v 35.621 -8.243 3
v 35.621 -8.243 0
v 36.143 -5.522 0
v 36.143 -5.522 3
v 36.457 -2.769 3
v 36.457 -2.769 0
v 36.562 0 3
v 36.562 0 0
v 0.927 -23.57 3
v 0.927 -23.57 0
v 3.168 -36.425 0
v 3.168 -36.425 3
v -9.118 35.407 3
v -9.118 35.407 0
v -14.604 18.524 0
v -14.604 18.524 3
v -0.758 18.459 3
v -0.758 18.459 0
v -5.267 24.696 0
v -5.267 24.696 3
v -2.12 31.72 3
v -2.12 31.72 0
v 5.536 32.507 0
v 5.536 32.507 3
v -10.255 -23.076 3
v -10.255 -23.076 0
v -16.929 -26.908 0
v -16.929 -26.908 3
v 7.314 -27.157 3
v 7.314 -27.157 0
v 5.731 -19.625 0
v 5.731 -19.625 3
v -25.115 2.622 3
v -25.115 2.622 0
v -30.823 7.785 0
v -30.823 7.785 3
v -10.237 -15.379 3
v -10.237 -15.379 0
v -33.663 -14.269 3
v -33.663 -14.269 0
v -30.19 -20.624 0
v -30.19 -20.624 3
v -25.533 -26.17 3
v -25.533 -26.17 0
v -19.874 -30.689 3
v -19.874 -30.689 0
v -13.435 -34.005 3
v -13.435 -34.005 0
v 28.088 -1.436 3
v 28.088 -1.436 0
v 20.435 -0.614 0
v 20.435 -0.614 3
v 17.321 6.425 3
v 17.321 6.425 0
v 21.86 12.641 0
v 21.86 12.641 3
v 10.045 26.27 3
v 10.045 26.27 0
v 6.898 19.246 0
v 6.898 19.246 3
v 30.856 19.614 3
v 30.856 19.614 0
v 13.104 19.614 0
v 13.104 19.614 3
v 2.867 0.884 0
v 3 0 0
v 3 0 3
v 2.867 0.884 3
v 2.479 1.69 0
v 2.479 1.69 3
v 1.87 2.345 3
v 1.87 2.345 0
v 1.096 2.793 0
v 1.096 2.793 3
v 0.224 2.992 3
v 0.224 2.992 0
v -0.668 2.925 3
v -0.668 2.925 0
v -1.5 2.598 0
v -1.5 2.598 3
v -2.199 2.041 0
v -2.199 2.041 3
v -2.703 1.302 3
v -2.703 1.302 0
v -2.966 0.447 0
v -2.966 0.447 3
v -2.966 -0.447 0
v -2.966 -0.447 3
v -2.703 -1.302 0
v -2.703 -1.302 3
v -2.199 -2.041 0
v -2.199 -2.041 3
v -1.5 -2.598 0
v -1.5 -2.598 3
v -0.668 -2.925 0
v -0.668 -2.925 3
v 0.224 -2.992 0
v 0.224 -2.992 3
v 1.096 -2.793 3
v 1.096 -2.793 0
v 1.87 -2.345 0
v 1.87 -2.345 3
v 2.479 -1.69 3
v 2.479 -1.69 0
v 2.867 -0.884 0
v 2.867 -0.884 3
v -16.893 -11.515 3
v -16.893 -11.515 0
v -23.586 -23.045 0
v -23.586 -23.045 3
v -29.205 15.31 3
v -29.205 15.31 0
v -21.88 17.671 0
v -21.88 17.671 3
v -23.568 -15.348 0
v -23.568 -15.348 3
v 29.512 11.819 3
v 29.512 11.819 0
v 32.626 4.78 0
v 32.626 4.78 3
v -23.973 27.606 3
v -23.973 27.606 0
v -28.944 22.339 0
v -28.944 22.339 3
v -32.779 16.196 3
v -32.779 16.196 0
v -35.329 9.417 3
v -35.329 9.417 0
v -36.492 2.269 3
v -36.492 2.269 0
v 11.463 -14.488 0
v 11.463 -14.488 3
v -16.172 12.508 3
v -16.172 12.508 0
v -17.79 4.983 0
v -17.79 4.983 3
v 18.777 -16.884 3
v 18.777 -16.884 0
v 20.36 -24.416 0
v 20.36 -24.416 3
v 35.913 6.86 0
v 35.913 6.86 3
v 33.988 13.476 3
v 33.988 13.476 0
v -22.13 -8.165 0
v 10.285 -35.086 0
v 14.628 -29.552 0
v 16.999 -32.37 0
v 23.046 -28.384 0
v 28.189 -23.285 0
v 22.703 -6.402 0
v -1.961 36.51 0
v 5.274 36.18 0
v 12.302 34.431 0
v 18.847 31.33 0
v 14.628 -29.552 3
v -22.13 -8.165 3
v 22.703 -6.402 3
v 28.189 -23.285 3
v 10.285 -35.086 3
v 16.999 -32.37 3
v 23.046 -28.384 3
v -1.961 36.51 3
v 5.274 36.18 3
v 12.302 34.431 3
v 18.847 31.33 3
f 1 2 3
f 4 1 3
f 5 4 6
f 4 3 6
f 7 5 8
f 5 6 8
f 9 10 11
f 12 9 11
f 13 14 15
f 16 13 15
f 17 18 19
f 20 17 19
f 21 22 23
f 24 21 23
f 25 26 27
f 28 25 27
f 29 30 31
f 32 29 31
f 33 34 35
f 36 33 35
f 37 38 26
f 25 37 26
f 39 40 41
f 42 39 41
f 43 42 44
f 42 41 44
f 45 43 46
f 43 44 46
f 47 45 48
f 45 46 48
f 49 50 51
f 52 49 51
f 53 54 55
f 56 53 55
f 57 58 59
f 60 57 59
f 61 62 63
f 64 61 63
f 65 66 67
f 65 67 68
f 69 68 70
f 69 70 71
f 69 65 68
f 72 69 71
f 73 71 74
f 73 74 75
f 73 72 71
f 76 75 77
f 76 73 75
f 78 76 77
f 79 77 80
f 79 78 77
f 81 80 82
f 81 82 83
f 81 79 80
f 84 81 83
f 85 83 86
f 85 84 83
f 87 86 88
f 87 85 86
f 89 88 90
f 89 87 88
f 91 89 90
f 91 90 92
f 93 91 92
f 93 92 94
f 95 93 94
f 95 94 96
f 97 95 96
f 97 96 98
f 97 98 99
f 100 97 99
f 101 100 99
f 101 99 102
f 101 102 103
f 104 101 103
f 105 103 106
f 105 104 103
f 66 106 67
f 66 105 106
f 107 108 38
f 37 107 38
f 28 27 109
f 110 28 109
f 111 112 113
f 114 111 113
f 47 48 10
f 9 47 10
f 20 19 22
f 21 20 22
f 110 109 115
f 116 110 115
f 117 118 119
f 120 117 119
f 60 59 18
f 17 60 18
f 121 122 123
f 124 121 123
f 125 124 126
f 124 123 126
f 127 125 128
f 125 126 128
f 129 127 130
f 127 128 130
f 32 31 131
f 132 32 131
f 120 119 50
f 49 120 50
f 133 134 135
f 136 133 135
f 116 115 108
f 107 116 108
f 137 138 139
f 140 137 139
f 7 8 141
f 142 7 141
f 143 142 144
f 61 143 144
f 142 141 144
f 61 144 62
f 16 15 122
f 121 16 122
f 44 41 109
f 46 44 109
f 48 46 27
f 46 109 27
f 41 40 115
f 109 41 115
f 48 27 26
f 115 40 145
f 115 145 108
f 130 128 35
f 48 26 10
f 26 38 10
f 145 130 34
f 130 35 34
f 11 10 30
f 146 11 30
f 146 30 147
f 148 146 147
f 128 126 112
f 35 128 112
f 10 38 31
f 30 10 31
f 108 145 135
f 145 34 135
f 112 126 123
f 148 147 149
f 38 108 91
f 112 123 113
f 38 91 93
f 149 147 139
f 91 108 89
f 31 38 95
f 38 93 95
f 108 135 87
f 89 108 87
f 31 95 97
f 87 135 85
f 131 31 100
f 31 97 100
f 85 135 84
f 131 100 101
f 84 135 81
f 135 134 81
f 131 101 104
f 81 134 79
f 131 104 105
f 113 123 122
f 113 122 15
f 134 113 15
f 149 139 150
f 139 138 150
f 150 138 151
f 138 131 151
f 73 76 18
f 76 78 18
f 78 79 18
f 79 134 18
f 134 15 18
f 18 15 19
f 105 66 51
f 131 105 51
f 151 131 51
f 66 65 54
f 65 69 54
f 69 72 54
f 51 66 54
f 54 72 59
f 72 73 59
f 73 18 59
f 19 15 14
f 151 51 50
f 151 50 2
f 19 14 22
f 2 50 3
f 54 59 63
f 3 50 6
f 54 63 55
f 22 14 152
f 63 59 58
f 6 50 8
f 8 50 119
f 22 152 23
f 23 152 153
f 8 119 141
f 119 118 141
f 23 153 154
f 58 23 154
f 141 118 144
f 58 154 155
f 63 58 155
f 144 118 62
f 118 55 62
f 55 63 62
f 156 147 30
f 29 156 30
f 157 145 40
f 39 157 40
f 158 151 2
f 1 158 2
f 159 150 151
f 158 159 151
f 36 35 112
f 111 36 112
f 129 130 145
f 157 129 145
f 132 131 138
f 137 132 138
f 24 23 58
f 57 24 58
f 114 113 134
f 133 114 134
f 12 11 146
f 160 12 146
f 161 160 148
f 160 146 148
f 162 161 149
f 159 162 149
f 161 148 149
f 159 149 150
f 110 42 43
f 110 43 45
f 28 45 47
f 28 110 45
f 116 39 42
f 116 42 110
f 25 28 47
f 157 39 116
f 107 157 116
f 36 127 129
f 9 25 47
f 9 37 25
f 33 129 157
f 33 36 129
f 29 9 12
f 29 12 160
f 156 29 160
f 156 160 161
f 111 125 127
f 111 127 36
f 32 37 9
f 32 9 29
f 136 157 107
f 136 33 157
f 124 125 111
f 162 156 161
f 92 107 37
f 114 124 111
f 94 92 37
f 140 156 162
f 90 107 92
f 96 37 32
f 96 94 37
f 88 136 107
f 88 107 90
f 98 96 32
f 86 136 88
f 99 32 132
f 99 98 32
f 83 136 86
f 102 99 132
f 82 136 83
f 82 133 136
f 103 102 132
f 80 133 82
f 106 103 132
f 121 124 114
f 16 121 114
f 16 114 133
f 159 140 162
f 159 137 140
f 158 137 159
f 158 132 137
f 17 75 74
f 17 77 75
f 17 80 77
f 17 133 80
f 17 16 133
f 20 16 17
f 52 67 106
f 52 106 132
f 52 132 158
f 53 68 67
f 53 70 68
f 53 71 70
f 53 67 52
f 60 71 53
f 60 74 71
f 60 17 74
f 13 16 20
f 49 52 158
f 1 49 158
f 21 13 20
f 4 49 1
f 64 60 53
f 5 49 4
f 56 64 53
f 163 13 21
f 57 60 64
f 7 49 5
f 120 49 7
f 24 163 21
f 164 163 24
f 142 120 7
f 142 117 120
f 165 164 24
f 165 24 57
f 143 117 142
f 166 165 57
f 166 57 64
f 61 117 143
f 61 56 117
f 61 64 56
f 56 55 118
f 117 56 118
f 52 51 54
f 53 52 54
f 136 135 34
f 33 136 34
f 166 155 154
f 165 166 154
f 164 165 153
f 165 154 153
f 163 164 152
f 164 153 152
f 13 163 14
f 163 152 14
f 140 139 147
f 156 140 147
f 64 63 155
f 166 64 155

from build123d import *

# Parameters (mm, degrees)
F0_R     = 3
F1_DEPTH = 3


with BuildPart() as f1:
    # F0 (on Top) → F1 (new body)
    with BuildSketch(Plane.XY):
        with BuildLine():
            ThreePointArc((35.620954, -8.242963), (36.326171, -4.148268), (36.562259, 0))
            ThreePointArc((36.562259, 0), (35.106793, 10.213321), (30.85627, 19.613501))
            Line((30.85627, 19.613501), (13.104219, 19.613501))
            Line((13.104219, 19.613501), (18.847004, 31.330325))
            ThreePointArc((18.847004, 31.330325), (5.274088, 36.179867), (-9.118436, 35.406962))
            Line((-9.118436, 35.406962), (-14.604121, 18.523758))
            Line((-14.604121, 18.523758), (-23.972865, 27.606169))
            ThreePointArc((-23.972865, 27.606169), (-32.779316, 16.196149), (-36.491773, 2.269205))
            Line((-36.491773, 2.269205), (-22.130062, -8.165189))
            Line((-22.130062, -8.165189), (-33.663049, -14.268774))
            ThreePointArc((-33.663049, -14.268774), (-25.532819, -26.170097), (-13.43472, -34.004516))
            Line((-13.43472, -34.004516), (0.926991, -23.570122))
            Line((0.926991, -23.570122), (3.167956, -36.424756))
            ThreePointArc((3.167956, -36.424756), (16.999166, -32.370159), (28.188659, -23.285152))
            Line((28.188659, -23.285152), (22.702974, -6.401948))
            Line((22.702974, -6.401948), (35.620954, -8.242963))
        make_face()
        Polygon((-16.89326, -11.515298), (-10.23678, -15.379139), (-10.254725, -23.07574), (-16.92915, -26.9085), (-23.58563, -23.044659), (-23.567685, -15.348058), align=None, mode=Mode.SUBTRACT)
        Polygon((5.731394, -19.624868), (11.463091, -14.488172), (18.777449, -16.883619), (20.36011, -24.415762), (14.628413, -29.552458), (7.314055, -27.157011), align=None, mode=Mode.SUBTRACT)
        Polygon((-16.172003, 12.508023), (-17.78977, 4.983341), (-25.115218, 2.622027), (-30.8229, 7.785395), (-29.205133, 15.310076), (-21.879685, 17.67139), align=None, mode=Mode.SUBTRACT)
        Circle(F0_R, mode=Mode.SUBTRACT)
        Polygon((20.435457, -0.613538), (17.32136, 6.424956), (21.859827, 12.64109), (29.51239, 11.818729), (32.626486, 4.780235), (28.08802, -1.435898), align=None, mode=Mode.SUBTRACT)
        Polygon((5.535865, 32.506806), (10.045296, 26.269577), (6.898412, 19.245681), (-0.757902, 18.459013), (-5.267333, 24.696242), (-2.12045, 31.720139), align=None, mode=Mode.SUBTRACT)
    extrude(amount=F1_DEPTH)


solid = f1.part
